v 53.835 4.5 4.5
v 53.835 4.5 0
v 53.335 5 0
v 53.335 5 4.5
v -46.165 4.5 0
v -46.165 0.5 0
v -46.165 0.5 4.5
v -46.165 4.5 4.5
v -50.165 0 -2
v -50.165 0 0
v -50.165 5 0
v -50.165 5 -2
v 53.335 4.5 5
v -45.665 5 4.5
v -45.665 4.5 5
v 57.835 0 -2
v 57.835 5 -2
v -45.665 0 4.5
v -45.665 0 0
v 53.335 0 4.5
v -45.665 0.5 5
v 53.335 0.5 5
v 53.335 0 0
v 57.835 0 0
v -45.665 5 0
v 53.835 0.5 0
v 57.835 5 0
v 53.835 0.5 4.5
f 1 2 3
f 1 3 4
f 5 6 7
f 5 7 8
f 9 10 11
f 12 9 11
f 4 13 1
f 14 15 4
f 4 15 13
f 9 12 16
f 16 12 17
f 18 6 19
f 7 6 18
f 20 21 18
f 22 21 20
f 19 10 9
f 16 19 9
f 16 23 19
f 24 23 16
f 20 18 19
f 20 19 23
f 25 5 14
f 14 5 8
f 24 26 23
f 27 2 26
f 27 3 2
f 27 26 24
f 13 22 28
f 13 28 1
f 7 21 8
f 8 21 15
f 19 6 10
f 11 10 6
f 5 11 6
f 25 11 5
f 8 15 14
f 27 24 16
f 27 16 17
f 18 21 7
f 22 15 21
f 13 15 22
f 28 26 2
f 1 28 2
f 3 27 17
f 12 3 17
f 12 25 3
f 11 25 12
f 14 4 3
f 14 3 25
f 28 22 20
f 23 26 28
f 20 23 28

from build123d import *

# Parameters (mm, degrees)
F0_W     = 100
F0_H     = 5
F1_DEPTH = 5
F0_W_2   = 4
F2_DEPTH = 2
F3_SIZE  = 0.5


with BuildPart() as f1:
    # F0 (on Top) → F1 (new body)
    with BuildSketch(Plane.XY):
        with Locations((3.835353, 2.5)):
            Rectangle(F0_W, F0_H)
    extrude(amount=F1_DEPTH)

    # F0 (on Top) → F2 (join)
    with BuildSketch(Plane.XY):
        with Locations((-48.164647, 2.5)):
            Rectangle(F0_W_2, F0_H)
        with Locations((3.835353, 2.5)):
            Rectangle(F0_W, F0_H)
        with Locations((55.835353, 2.5)):
            Rectangle(F0_W_2, F0_H)
    extrude(amount=-F2_DEPTH)

    # F3
    f3_edges = [f1.edges().sort_by_distance(p)[0] for p in [
        (-46.164647, 2.5, 5),
        (3.835353, 0, 5),
        (53.835353, 2.5, 5),
        (3.835353, 5, 5),
        (53.835353, 5, 2.5),
        (53.835353, 0, 2.5),
        (-46.164647, 0, 2.5),
        (-46.164647, 5, 2.5),
    ]]
    chamfer(f3_edges, length=F3_SIZE)


solid = f1.part
